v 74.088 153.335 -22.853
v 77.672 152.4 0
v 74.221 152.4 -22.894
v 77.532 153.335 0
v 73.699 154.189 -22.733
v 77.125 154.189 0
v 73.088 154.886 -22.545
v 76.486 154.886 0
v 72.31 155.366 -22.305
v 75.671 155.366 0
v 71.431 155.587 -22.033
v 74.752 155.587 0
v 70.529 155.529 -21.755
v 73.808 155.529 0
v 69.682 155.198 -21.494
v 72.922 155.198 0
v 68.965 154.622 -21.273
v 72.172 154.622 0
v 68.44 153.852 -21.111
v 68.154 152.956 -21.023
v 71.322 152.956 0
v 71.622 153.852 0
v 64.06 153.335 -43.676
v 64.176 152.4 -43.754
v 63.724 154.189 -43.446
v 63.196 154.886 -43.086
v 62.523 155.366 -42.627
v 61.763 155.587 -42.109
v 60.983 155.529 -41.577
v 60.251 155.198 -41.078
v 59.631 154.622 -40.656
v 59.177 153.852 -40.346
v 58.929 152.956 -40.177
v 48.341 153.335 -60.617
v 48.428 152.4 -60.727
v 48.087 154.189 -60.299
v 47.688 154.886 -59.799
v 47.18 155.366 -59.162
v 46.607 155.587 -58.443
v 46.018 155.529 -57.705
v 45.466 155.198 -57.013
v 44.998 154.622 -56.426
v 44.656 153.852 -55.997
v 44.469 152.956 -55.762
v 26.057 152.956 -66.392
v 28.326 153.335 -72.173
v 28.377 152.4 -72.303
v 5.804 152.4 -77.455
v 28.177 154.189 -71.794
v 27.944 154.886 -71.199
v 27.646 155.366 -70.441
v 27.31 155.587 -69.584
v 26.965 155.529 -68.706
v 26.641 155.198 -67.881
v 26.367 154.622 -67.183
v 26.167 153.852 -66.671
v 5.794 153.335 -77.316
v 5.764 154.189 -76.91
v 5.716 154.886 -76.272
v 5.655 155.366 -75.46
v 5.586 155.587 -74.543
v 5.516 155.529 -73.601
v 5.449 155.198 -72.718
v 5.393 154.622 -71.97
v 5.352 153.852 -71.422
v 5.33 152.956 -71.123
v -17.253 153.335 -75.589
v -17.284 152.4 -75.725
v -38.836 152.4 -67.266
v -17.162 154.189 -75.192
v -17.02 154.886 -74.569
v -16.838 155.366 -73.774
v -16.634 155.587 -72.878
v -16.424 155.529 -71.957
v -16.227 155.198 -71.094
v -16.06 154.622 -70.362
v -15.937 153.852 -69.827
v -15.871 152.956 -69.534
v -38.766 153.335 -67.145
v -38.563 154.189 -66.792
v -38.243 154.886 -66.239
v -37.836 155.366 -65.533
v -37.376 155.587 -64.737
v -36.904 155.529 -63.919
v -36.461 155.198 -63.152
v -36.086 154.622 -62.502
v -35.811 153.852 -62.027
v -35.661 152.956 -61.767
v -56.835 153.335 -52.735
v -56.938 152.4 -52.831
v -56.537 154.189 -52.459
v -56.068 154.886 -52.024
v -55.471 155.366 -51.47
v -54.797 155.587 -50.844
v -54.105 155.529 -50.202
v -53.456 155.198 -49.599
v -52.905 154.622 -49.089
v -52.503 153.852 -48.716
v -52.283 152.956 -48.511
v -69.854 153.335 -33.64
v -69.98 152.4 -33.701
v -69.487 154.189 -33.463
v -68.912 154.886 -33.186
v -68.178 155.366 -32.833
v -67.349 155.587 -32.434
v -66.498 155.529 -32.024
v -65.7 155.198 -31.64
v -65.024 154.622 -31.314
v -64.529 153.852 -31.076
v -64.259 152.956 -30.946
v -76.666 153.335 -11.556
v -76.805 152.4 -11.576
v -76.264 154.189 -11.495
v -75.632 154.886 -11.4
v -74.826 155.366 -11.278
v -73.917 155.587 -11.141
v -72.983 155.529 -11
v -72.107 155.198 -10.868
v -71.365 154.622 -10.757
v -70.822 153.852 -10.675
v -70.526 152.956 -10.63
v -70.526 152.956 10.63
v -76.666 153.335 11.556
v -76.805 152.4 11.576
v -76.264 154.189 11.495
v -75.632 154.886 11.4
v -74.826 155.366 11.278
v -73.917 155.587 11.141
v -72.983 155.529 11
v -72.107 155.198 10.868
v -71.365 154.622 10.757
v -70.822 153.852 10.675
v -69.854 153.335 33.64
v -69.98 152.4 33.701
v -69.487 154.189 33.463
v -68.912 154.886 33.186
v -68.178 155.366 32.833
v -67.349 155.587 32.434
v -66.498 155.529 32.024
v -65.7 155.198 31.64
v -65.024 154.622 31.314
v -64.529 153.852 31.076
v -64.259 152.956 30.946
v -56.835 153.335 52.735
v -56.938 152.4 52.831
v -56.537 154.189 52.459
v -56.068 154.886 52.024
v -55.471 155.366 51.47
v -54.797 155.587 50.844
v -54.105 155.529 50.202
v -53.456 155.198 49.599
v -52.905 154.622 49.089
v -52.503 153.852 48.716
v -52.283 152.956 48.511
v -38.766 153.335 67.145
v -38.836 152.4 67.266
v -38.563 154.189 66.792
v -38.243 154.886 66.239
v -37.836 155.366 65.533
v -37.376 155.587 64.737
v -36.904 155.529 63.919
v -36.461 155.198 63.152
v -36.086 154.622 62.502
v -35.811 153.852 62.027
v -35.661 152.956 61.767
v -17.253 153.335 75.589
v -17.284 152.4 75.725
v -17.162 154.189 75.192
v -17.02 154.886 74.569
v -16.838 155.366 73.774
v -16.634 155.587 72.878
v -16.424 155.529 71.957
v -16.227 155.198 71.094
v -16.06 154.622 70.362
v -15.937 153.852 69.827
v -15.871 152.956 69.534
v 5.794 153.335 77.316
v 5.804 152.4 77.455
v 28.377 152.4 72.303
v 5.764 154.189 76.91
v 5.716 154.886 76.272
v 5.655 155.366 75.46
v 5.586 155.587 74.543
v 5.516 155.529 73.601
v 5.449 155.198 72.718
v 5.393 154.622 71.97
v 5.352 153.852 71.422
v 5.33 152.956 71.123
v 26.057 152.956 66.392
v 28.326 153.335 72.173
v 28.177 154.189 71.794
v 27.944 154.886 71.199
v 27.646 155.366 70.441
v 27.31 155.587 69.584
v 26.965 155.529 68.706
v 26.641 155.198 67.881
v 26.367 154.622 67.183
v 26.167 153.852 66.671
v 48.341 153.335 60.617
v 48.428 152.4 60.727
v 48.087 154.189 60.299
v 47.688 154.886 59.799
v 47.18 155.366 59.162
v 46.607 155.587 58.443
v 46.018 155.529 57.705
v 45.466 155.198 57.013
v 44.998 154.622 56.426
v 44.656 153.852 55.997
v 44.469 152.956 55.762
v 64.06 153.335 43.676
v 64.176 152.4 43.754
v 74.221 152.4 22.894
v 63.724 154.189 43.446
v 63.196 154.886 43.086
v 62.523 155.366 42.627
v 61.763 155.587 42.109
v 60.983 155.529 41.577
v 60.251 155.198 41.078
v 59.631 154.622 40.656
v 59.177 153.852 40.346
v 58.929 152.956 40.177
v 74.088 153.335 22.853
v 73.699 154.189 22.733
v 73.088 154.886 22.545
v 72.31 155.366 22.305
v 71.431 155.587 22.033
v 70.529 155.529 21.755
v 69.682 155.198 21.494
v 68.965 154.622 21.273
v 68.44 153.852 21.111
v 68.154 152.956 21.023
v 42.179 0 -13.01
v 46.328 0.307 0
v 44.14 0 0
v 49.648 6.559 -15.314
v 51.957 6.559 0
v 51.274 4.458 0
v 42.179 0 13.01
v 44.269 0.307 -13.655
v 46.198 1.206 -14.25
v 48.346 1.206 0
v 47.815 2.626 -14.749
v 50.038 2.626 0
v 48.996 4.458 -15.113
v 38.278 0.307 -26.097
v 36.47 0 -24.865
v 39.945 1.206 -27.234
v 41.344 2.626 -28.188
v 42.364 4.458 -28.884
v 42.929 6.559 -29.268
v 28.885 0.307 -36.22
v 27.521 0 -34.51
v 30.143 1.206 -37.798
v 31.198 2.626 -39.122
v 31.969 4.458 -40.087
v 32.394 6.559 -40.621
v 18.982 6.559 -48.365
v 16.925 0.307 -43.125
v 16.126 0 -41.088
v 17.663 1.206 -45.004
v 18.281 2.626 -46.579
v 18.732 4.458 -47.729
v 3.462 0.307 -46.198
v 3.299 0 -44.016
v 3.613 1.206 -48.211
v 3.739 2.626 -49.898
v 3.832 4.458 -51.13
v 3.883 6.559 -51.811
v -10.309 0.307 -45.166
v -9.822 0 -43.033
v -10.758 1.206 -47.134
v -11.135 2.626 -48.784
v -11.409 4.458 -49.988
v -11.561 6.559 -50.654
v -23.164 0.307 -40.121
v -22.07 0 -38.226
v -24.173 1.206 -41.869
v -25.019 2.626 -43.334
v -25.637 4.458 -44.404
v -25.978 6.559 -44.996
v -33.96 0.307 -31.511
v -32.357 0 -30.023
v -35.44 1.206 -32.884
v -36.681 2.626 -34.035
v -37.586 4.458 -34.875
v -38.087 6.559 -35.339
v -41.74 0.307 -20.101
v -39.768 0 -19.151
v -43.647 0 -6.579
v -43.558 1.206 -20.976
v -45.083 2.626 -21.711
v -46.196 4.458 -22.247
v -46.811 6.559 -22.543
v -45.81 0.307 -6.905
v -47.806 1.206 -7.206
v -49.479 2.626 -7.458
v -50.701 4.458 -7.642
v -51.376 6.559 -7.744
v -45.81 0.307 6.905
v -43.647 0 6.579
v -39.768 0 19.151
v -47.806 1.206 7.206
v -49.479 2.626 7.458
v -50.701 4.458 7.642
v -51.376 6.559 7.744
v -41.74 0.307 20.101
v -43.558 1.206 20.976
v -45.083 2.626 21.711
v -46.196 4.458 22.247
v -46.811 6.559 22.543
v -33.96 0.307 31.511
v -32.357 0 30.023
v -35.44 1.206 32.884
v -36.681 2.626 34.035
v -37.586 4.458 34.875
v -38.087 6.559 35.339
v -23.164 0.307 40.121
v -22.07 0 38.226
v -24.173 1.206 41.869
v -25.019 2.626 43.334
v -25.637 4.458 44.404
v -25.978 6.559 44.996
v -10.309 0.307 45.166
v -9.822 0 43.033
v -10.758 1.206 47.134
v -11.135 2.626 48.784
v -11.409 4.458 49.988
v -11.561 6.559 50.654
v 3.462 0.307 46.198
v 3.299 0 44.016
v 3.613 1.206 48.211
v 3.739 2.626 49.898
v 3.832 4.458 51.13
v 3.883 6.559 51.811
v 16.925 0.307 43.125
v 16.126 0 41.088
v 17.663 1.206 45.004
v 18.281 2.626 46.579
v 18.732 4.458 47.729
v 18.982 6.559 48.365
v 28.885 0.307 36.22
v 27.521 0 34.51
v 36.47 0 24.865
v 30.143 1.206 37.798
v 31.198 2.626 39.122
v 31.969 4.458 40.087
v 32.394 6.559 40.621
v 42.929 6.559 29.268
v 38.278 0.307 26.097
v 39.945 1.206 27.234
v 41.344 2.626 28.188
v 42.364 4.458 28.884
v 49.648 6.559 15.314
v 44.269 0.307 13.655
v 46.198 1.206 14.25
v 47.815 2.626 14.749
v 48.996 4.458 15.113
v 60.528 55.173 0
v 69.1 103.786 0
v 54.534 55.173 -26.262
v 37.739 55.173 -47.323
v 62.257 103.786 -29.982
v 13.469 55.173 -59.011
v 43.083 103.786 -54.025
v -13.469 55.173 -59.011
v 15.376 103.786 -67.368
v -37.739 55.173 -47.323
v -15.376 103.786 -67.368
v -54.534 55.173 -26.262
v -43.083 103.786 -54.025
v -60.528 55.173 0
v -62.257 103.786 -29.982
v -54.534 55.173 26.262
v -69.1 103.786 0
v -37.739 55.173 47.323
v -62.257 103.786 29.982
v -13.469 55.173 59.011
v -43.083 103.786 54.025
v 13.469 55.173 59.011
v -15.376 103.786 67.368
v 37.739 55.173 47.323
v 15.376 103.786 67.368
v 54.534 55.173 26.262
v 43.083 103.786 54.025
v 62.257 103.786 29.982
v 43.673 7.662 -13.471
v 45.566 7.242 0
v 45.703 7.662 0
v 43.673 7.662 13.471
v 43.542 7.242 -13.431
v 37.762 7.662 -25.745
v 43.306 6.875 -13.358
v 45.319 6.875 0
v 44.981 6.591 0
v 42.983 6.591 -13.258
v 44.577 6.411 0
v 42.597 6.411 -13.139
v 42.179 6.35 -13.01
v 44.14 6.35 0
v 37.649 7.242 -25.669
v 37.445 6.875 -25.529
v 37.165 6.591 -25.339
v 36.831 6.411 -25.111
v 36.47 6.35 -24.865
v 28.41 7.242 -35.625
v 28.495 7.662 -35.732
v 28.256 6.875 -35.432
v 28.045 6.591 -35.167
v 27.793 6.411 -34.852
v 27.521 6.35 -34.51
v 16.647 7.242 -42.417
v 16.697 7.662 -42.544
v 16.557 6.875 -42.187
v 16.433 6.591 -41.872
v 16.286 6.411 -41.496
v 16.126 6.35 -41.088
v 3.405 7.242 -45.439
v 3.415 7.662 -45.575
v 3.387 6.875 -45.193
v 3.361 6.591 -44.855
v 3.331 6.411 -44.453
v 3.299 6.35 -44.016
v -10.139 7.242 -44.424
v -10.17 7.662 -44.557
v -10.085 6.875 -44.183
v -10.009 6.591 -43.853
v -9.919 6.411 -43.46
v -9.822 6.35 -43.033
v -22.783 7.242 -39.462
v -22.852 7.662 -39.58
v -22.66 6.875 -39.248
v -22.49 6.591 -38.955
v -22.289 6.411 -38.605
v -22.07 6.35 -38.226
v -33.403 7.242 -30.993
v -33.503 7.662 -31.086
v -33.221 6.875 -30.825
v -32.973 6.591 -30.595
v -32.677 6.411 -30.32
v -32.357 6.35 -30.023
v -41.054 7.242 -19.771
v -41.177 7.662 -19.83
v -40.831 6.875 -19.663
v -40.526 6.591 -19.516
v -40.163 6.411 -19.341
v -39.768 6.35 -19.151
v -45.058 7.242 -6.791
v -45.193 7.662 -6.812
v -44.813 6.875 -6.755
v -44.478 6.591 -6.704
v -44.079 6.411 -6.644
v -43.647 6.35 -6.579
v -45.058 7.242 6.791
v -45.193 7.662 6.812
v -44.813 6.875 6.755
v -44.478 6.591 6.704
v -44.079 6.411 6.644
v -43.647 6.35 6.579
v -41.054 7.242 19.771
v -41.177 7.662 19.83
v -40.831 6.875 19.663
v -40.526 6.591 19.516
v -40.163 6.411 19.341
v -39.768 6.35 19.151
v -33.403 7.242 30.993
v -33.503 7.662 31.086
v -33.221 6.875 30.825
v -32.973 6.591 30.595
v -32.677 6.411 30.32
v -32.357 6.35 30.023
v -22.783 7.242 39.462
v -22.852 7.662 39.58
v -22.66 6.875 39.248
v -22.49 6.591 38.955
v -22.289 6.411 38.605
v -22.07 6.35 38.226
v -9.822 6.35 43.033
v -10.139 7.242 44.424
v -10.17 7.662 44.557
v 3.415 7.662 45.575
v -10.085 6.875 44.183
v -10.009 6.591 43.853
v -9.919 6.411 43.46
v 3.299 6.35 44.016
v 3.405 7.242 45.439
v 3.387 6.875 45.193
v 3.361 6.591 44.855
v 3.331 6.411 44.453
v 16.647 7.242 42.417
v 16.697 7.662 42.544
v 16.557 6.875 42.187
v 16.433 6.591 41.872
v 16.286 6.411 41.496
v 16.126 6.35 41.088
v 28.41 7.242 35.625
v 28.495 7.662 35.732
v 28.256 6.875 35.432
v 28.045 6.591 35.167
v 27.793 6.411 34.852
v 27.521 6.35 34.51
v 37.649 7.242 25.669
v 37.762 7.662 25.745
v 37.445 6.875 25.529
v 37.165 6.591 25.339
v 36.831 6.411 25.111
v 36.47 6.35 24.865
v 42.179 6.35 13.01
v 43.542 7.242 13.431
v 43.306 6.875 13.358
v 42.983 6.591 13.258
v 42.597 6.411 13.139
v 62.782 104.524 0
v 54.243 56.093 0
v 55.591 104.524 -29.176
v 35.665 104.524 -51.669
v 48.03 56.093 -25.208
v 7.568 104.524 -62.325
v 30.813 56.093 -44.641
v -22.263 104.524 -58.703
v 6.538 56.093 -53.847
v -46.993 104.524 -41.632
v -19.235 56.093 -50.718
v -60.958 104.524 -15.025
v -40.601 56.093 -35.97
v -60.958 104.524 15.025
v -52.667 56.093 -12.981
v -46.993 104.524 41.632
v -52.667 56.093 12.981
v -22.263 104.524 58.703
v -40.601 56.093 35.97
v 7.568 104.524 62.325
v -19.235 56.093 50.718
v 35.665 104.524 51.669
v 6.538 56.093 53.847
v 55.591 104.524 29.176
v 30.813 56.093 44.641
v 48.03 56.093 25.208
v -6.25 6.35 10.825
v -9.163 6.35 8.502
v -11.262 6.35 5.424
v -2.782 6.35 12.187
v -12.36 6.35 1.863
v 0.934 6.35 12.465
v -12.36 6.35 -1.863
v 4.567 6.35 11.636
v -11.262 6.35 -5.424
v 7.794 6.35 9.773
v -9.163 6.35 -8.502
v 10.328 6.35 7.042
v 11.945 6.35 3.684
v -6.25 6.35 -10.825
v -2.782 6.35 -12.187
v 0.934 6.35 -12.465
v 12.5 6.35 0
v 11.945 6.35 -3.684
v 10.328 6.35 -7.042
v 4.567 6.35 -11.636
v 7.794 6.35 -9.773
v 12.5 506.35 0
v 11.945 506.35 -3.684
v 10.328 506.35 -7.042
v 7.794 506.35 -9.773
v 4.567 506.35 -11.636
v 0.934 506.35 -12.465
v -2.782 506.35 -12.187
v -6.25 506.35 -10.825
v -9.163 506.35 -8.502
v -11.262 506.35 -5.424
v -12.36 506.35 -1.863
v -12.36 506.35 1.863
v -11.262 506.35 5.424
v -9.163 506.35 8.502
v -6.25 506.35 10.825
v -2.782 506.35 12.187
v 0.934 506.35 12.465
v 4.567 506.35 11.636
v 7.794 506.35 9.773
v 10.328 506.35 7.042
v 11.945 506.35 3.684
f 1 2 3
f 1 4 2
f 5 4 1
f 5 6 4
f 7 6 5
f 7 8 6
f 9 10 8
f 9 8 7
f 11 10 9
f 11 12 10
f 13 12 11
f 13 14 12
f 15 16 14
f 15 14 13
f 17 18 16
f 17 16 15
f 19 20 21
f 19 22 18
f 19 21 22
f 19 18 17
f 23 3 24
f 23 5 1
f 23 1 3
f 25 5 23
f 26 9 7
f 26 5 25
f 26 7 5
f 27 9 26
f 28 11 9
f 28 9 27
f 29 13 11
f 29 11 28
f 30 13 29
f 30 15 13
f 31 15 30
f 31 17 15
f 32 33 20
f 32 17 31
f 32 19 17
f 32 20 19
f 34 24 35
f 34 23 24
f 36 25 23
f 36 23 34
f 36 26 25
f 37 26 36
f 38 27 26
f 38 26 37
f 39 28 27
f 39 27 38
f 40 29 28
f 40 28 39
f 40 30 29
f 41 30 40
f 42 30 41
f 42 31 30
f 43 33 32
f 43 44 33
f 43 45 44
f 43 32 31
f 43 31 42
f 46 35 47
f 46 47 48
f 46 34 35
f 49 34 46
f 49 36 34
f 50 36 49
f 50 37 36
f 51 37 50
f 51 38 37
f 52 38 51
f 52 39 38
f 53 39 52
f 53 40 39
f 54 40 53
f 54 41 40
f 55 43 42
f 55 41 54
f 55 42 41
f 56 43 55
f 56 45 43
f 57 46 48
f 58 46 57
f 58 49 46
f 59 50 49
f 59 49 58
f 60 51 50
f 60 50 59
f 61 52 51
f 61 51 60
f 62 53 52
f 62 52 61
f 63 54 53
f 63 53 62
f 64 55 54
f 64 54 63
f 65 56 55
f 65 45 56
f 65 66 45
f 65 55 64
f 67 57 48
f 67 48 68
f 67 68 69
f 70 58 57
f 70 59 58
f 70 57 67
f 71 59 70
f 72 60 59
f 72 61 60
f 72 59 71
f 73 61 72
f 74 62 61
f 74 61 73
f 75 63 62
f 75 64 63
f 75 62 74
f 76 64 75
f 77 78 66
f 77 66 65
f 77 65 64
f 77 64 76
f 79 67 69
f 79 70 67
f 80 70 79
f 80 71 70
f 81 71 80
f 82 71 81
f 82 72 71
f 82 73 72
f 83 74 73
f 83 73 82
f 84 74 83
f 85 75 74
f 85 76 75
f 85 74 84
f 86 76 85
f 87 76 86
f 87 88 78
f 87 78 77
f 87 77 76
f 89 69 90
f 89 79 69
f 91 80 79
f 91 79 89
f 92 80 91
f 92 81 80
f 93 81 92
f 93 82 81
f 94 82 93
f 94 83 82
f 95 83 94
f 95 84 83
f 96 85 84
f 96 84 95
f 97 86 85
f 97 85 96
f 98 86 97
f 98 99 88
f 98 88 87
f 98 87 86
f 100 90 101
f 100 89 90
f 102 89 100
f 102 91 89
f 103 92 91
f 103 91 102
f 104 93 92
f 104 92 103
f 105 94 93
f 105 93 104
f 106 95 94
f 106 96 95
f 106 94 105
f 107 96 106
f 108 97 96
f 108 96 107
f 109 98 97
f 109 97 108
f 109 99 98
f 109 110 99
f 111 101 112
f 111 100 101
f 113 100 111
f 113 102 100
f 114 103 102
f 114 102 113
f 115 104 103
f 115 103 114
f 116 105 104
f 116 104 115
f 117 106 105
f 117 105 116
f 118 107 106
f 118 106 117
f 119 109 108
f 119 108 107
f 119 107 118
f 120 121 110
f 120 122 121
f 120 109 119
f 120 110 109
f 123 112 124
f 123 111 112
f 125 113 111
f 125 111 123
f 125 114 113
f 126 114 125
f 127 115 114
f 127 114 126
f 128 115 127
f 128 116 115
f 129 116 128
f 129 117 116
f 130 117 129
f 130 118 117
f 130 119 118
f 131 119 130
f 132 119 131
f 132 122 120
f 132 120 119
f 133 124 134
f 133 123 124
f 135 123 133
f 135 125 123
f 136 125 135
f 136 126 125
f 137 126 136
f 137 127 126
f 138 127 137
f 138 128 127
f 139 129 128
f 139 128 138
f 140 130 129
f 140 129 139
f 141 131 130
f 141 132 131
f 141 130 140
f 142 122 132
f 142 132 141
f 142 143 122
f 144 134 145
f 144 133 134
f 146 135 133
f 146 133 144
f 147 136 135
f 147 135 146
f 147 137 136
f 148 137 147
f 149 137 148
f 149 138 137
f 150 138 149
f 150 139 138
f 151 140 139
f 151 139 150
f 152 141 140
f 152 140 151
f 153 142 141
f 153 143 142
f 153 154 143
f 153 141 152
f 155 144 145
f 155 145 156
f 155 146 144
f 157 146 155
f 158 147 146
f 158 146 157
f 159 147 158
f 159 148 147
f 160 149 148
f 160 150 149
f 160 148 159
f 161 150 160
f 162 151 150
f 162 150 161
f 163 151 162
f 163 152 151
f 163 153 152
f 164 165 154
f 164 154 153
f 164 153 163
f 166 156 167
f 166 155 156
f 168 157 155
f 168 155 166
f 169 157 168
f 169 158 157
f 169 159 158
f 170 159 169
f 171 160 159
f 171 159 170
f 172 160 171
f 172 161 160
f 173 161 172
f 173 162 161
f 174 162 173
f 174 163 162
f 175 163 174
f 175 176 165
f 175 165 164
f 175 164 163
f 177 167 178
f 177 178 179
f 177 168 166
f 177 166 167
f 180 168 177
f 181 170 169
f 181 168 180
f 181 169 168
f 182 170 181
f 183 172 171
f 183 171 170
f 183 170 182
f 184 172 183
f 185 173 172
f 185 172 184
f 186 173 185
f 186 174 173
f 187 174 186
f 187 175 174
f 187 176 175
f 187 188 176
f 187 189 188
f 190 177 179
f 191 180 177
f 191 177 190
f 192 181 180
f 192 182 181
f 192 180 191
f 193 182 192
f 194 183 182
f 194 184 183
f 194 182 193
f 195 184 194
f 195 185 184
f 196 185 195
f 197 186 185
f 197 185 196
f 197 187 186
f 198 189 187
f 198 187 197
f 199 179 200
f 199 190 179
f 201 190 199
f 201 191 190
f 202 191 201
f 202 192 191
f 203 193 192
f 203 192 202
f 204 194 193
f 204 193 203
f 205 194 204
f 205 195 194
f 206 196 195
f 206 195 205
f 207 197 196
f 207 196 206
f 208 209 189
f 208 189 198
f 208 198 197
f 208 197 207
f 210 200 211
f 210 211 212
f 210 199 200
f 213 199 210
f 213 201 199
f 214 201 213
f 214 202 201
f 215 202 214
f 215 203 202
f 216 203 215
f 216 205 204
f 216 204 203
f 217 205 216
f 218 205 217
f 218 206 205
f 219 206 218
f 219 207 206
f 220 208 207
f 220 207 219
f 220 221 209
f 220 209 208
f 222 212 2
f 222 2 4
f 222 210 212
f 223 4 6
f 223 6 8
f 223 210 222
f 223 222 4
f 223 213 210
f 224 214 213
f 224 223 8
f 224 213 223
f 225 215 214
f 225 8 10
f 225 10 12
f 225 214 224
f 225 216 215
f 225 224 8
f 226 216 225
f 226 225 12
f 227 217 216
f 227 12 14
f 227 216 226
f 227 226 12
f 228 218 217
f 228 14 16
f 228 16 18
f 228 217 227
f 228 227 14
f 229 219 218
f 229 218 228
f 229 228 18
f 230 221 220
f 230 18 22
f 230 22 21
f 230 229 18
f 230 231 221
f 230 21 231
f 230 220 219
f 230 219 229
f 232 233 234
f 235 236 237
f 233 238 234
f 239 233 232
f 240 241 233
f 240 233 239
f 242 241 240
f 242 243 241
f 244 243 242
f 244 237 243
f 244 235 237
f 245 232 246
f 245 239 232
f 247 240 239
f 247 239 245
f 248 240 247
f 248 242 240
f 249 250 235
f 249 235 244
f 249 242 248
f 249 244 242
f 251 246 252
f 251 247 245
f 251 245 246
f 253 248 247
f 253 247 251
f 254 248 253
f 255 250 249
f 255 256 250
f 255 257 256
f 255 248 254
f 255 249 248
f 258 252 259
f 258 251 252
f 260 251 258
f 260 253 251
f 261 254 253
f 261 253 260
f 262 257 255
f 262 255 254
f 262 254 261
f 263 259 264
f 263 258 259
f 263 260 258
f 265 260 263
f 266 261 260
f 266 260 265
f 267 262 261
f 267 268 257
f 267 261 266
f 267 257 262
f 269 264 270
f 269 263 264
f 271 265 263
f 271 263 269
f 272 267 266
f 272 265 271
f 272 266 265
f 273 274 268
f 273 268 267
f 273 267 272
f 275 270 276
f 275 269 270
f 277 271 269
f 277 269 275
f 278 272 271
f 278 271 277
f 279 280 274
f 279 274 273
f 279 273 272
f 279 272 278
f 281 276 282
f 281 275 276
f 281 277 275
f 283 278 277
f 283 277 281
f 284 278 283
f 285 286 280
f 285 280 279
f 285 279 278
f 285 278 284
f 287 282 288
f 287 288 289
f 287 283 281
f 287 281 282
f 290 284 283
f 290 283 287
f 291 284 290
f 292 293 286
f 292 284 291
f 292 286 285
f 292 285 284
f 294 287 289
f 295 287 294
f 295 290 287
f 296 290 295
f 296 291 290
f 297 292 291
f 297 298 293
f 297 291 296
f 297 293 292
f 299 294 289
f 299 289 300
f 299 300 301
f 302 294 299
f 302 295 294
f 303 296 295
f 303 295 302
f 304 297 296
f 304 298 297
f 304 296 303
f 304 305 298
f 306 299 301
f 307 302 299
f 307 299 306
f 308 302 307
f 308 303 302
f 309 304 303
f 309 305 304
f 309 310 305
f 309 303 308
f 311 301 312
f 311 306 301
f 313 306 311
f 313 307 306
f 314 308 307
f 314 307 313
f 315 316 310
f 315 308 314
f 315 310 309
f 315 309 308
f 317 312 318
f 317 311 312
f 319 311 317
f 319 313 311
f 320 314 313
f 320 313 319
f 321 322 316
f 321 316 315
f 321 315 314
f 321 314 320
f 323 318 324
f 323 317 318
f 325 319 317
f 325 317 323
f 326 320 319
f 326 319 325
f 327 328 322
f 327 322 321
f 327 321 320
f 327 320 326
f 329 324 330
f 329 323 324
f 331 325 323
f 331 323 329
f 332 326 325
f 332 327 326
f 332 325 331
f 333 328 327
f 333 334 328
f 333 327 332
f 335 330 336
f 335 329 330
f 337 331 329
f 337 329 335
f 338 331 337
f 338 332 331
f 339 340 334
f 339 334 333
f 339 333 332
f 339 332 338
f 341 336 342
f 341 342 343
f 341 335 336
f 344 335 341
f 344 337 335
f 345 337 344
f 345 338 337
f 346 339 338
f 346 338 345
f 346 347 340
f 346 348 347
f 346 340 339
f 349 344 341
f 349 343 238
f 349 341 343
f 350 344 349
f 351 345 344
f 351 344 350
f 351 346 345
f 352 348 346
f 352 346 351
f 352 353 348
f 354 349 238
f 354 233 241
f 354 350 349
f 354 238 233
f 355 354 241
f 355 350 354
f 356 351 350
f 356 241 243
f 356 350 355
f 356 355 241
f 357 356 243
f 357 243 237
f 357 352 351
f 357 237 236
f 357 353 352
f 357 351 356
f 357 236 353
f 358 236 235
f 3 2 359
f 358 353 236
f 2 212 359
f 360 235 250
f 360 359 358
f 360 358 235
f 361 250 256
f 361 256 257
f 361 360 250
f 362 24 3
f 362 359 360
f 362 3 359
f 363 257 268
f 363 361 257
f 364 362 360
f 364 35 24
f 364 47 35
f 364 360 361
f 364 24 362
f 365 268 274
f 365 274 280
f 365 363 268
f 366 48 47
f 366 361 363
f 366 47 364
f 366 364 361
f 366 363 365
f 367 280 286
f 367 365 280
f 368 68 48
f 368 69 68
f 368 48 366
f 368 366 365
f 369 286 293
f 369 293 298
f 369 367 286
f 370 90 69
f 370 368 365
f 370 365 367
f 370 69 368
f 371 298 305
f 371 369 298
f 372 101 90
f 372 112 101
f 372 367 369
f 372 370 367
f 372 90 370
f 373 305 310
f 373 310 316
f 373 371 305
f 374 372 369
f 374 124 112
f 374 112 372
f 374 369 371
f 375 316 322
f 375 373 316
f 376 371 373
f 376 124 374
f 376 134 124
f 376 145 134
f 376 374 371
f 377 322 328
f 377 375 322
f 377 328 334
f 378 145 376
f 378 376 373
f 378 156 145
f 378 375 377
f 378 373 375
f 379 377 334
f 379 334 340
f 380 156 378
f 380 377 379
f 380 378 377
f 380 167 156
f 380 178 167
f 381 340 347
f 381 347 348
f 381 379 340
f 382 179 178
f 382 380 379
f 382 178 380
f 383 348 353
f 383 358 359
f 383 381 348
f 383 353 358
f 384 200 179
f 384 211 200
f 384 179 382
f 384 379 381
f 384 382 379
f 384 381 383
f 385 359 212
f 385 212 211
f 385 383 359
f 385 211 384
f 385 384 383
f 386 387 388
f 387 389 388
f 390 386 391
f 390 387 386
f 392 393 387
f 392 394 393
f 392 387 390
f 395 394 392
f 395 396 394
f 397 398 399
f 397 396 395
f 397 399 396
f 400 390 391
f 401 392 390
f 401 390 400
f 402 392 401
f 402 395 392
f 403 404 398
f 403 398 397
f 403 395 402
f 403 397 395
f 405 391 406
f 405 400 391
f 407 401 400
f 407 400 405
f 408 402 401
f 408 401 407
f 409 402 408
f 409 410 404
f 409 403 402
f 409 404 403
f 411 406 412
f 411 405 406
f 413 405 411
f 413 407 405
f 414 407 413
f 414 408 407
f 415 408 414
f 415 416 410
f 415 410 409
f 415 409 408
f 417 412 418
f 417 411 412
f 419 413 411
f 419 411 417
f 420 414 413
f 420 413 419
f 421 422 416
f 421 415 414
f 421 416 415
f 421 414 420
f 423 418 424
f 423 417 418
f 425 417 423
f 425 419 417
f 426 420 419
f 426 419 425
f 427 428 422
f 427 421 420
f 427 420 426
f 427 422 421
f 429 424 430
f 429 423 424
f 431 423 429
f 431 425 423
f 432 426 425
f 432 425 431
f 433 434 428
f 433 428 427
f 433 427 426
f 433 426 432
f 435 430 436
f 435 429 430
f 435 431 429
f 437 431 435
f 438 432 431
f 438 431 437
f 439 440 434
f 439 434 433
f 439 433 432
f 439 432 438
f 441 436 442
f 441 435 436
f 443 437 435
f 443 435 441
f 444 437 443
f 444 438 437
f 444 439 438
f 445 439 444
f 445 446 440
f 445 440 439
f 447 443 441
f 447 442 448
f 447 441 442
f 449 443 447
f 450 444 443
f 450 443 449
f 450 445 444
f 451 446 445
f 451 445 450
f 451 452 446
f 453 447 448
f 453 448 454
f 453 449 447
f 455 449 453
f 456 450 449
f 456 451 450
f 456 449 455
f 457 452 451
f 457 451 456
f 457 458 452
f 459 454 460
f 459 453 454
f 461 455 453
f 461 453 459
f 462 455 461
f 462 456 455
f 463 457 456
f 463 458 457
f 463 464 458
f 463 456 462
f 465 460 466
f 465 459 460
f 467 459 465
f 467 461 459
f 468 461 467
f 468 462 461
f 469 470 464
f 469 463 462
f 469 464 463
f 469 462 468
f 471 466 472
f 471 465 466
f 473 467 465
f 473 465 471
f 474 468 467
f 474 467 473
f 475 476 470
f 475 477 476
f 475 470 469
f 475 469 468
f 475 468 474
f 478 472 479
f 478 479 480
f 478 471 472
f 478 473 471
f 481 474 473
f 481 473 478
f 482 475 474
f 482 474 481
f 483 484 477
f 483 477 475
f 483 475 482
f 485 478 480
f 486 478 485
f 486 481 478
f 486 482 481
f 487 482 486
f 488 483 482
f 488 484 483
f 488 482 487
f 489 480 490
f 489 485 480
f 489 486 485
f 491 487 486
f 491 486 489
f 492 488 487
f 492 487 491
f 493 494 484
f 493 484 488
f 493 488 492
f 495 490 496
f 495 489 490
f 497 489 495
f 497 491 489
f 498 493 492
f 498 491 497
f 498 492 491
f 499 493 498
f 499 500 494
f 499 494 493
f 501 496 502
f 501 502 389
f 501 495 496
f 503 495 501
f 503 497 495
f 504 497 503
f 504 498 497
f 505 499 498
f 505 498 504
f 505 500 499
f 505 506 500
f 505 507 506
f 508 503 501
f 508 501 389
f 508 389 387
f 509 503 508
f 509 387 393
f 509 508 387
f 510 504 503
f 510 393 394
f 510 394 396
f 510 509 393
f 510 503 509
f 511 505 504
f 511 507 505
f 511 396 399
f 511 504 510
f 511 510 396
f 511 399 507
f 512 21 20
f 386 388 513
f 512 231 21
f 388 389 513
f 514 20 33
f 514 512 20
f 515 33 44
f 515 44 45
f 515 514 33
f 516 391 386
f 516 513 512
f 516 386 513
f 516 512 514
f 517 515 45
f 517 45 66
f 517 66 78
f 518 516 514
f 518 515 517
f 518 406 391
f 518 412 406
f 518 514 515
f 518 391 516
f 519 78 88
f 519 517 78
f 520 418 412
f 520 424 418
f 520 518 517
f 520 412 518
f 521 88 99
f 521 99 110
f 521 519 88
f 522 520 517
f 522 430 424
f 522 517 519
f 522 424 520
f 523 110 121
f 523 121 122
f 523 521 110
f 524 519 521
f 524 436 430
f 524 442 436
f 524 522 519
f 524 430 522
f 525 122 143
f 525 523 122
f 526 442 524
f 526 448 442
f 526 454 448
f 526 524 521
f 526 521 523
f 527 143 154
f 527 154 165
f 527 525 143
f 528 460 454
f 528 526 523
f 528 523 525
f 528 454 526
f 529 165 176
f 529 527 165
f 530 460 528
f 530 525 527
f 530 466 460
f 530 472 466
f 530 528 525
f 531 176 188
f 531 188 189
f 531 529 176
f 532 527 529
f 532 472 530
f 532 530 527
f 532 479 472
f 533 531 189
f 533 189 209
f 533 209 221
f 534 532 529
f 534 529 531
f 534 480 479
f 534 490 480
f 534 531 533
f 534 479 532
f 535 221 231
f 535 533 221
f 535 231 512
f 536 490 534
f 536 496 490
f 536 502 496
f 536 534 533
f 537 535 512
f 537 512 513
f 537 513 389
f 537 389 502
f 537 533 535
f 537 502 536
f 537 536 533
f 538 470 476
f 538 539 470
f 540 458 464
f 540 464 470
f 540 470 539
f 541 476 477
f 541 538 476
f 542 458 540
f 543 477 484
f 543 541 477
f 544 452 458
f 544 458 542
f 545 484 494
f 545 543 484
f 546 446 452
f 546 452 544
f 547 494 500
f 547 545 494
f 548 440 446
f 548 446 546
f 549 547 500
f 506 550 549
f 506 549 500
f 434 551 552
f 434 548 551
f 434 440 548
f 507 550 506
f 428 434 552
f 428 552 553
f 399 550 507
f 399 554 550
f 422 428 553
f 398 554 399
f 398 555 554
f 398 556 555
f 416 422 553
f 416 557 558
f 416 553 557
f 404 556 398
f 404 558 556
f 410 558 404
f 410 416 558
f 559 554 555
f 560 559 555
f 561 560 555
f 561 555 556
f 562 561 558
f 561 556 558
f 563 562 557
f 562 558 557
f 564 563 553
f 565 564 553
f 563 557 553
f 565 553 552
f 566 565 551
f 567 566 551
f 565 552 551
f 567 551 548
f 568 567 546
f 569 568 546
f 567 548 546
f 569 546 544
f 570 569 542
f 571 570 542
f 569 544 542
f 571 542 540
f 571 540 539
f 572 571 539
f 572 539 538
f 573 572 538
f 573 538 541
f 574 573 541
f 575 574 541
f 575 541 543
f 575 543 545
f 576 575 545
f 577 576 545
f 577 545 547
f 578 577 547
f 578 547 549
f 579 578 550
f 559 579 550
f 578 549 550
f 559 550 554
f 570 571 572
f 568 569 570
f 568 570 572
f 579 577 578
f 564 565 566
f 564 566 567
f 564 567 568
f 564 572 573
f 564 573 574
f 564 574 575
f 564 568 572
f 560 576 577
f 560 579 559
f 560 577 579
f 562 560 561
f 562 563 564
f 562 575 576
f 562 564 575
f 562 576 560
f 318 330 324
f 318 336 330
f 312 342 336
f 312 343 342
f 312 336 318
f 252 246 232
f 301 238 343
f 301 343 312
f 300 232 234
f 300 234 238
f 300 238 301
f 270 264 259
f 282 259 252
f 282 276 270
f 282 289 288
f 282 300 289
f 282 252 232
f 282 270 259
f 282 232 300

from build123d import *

# Parameters (mm, degrees)
ESQUISSE1_R        = 12.5
BOSS_EXTRU_2_DEPTH = 500


with BuildPart() as part:
    # Sketch1 → Revolve1 (revolve)
    with BuildSketch(Plane.XY):
        with BuildLine():
            Line((0, 0), (44.139646678, 0))
            ThreePointArc((44.139646678, 0), (49.241773329, 1.857022233), (51.956558217, 6.55916759))
            Line((51.956558217, 6.55916759), (77.67223186, 152.4))
            ThreePointArc((77.67223186, 152.4), (74.751767132, 155.587127984), (71.32223186, 152.955553013))
            Line((71.32223186, 152.955553013), (45.703028985, 7.661833518))
            ThreePointArc((45.703028985, 7.661833518), (45.160072008, 6.721404447), (44.139646678, 6.35))
            Line((44.139646678, 6.35), (0, 6.35))
            Line((0, 6.35), (0, 0))
        make_face()
    revolve(axis=Axis((0, 0, 0), (0, 1, 0)))

    # Esquisse1 → Boss.-Extru.2 (add)
    with BuildSketch(Plane(origin=(0, 6.35, 0), x_dir=(1, 0, 0), z_dir=(0, 1, 0))):
        Circle(ESQUISSE1_R)
    extrude(amount=BOSS_EXTRU_2_DEPTH)


solid = part.part
